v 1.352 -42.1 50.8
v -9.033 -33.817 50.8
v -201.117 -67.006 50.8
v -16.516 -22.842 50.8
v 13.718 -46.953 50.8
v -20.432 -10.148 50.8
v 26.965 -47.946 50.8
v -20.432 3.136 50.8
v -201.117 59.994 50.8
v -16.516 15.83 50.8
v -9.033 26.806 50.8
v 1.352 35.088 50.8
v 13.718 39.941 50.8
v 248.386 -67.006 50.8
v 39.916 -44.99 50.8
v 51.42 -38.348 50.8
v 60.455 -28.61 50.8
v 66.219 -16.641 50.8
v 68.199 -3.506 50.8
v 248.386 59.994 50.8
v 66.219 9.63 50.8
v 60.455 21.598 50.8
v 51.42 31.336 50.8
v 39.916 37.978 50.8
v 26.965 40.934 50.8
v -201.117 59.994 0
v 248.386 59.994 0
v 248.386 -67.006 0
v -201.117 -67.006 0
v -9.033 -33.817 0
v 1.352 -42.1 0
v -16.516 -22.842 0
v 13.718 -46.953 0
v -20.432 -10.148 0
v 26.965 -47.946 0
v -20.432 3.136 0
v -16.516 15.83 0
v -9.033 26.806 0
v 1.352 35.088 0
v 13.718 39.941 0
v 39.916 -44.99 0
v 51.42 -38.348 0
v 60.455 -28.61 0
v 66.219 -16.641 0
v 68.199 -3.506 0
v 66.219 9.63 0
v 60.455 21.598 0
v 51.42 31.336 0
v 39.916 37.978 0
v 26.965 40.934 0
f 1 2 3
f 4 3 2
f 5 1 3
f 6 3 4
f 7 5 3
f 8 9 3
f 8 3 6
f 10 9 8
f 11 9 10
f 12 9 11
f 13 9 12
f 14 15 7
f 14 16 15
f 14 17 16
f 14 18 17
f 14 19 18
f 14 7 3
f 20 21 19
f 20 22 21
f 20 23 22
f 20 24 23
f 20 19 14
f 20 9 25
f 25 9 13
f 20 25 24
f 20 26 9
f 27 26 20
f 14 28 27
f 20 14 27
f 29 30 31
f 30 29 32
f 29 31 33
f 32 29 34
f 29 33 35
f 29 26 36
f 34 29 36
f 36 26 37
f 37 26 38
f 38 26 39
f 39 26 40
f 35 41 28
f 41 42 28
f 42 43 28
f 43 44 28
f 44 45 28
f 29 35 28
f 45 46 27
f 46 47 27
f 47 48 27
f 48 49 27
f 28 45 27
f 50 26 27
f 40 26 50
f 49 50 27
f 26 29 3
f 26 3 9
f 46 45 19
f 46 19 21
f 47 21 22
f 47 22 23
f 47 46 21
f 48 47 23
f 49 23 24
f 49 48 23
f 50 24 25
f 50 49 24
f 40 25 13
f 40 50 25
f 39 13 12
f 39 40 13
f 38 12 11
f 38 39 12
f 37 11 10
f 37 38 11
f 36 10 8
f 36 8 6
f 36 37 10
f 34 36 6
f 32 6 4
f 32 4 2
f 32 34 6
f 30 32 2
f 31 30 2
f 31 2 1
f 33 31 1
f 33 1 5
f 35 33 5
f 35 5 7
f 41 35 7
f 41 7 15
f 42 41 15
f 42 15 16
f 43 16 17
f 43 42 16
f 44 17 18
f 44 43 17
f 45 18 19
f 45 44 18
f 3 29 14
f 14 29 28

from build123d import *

# Parameters (mm, degrees)
F0_W     = 449.5038
F0_H     = 127
F0_R     = 44.5643
F1_DEPTH = 50.8
F2_DEPTH = 50.8


with BuildPart() as f1:
    # F0 (on Top) → F1 (new body)
    with BuildSketch(Plane.XY):
        with Locations((23.634577, -3.505918)):
            Rectangle(F0_W, F0_H)
        with Locations((23.634577, -3.505918)):
            Circle(F0_R, mode=Mode.SUBTRACT)
    extrude(amount=F1_DEPTH)

    # F0 (on Top) → F2 (join)
    with BuildSketch(Plane.XY):
        with Locations((23.634577, -3.505918)):
            Rectangle(F0_W, F0_H)
        with Locations((23.634577, -3.505918)):
            Circle(F0_R, mode=Mode.SUBTRACT)
    extrude(amount=F2_DEPTH)


solid = f1.part
